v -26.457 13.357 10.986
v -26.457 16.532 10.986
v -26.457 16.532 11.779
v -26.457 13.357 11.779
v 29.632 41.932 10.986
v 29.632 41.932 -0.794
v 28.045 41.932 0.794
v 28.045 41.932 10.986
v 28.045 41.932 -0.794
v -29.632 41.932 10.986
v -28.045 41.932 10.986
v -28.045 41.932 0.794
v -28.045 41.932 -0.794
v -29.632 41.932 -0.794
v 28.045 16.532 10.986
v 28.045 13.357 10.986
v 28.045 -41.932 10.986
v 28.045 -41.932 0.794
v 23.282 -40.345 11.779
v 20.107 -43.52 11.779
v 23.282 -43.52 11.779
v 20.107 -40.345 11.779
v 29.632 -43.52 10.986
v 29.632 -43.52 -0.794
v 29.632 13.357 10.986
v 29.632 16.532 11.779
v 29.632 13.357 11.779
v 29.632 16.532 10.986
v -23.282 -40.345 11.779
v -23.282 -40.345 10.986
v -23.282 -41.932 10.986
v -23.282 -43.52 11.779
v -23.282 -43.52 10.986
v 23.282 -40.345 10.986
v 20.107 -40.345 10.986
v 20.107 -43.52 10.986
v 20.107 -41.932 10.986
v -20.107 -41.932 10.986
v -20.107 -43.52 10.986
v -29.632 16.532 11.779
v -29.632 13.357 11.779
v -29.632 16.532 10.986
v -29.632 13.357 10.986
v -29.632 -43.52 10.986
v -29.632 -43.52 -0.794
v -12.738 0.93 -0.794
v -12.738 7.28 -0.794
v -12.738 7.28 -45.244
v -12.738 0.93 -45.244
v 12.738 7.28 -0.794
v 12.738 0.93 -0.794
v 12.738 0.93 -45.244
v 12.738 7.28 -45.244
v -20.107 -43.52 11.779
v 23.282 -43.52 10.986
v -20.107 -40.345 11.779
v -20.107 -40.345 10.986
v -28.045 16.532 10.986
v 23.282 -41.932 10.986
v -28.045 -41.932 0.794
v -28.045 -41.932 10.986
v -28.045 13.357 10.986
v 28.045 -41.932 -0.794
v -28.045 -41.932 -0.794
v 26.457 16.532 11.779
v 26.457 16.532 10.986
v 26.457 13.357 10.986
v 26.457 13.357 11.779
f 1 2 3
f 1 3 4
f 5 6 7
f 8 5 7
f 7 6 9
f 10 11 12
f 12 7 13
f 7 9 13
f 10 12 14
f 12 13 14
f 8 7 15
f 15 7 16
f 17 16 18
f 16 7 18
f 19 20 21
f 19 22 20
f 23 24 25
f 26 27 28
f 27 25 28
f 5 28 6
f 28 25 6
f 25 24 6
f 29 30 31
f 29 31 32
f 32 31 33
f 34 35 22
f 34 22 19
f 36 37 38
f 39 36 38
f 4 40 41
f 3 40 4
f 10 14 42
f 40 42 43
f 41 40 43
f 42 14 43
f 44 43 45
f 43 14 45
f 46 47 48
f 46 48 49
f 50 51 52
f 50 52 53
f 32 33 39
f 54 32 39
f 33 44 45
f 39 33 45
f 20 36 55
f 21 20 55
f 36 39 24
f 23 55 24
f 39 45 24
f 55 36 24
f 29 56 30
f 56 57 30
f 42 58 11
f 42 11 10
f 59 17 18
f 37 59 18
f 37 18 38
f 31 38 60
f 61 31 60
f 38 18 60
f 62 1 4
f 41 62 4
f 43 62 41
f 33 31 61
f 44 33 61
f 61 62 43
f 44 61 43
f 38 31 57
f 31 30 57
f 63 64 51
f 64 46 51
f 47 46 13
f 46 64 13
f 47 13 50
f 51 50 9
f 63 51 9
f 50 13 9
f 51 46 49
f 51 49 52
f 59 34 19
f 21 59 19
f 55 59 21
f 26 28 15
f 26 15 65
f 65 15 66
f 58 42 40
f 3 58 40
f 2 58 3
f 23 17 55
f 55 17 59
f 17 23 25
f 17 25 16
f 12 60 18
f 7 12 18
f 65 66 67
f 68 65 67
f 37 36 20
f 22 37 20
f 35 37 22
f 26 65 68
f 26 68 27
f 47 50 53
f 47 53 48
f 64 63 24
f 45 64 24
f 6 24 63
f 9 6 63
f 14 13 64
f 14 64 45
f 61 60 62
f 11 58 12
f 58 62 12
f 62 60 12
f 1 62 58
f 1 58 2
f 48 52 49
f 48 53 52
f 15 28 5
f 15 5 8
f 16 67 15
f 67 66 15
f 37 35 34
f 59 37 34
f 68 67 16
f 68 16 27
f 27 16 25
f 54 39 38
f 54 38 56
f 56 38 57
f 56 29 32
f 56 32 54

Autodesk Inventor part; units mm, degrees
ref_plane "YZ Plane" through (0, 0, 0) normal (1, 0, 0) x (0, 1, 0)
ref_plane "XZ Plane" through (0, 0, 0) normal (0, 1, 0) x (-1, 0, 0)
ref_plane "XY Plane" through (0, 0, 0) normal (0, 0, 1) x (1, 0, 0)
sketch "Sketch1" plane through (0, 0, 0) normal (0, 0, 1) x (1, 0, 0)
  line L0 (28.0448, -41.9322) -> (-28.0448, -41.9322)
  line L1 (-28.0448, -41.9322) -> (-28.0448, 41.9322)
  line L2 (-28.0448, 41.9322) -> (28.0448, 41.9322)
  line L3 (28.0448, 41.9322) -> (28.0448, -41.9322)
  line L4 (28.0448, -41.9322) -> (-28.0448, 41.9322) construction
  line L5 (-28.0448, -41.9322) -> (28.0448, 41.9322) construction
  point P0 (0, 0)
  dimension "d0" = 56.0896
  dimension "d1" = 83.8645
extrude "Container Backplate" add sketch "Sketch1" along normal mid plane 1.5875
sketch "Sketch2" plane through (0, 0, -0.7937) normal (0, 0, -1) x (-1, 0, 0)
  line L0 (28.0448, 41.9322) -> (-28.0448, 41.9322) projected
  line L1 (-28.0448, 41.9322) -> (-28.0448, -41.9322) projected
  line L2 (-28.0448, -41.9322) -> (28.0448, -41.9322) projected
  line L3 (28.0448, -41.9322) -> (28.0448, 41.9322) projected
  line L4 (-29.6323, 43.5197) -> (29.6323, 43.5197)
  line L5 (29.6323, 43.5197) -> (29.6323, -43.5197)
  line L6 (29.6323, -43.5197) -> (-29.6323, -43.5197)
  line L7 (-29.6323, -43.5197) -> (-29.6323, 43.5197)
  line L8 (28.0448, 41.9322) -> (29.6323, 41.9322)
  line L9 (-28.0448, 41.9322) -> (-29.6323, 41.9322)
  point P0 (0, 0)
  point P1 (28.0448, 43.5197)
  point P2 (-28.0448, 43.5197)
  dimension "d4" = 1.5875
extrude "Container Walls" add sketch "Sketch2" against normal blind 11.7792 contours L8 L5 L6 L7 L9 L1 L2 L3
sketch "Sketch3" plane through (0, 0, 10.9855) normal (0, 0, 1) x (1, 0, 0)
  line L0 (-23.2823, -43.5197) -> (-20.1073, -43.5197)
  line L1 (-20.1073, -43.5197) -> (-20.1073, -40.3447)
  line L2 (-20.1073, -40.3447) -> (-23.2823, -40.3447)
  line L3 (-23.2823, -40.3447) -> (-23.2823, -43.5197)
  line L4 (-29.6323, -43.5197) -> (29.6323, -43.5197) projected
  line L5 (28.0448, -41.9322) -> (-28.0448, -41.9322) projected
  line L6 (-29.6323, 41.9322) -> (-29.6323, -43.5197) projected
  line L7 (-29.6323, 16.5322) -> (-26.4573, 16.5322)
  line L8 (-26.4573, 16.5322) -> (-26.4573, 13.3572)
  line L9 (-26.4573, 13.3572) -> (-29.6323, 13.3572)
  line L10 (-29.6323, 13.3572) -> (-29.6323, 16.5322)
  line L11 (28.0448, 41.9322) -> (-28.0448, 41.9322) projected
  line L12 (0, 41.9322) -> (0, -43.5197)
  line L13 (23.2823, -43.5197) -> (20.1073, -43.5197)
  line L14 (20.1073, -43.5197) -> (20.1073, -40.3447)
  line L15 (20.1073, -40.3447) -> (23.2823, -40.3447)
  line L16 (23.2823, -40.3447) -> (23.2823, -43.5197)
  line L17 (29.6323, 43.5197) -> (29.6323, -43.5197)
  line L18 (29.6323, 16.5322) -> (26.4573, 16.5322)
  line L19 (26.4573, 16.5322) -> (26.4573, 13.3572)
  line L20 (26.4573, 13.3572) -> (29.6323, 13.3572)
  line L21 (29.6323, 13.3572) -> (29.6323, 16.5322)
  point P0 (0, 0)
  point P1 (-29.6323, 43.5197)
  dimension "d7" = 3.175
  dimension "d8" = 3.175
  dimension "d9" = 6.35
  dimension "d10" = 3.175
  dimension "d11" = 3.175
  dimension "d12" = 25.4
extrude "Container Tabs" add sketch "Sketch3" along normal blind 0.7937 contours L3 L5 L1 L0 | L20 L19 L18 L17 | L6 L7 L8 L9 | L3 L2 L1 L5 | L14 L5 L16 L4 | L14 L15 L16 L5
sketch "Sketch11" plane through (0, 0, -0.7937) normal (0, 0, -1) x (-1, 0, 0)
  line L0 (-12.7381, 7.2803) -> (12.7381, 7.2803)
  line L1 (12.7381, 7.2803) -> (12.7381, 0.9303)
  line L2 (12.7381, 0.9303) -> (-12.7381, 0.9303)
  line L3 (-12.7381, 0.9303) -> (-12.7381, 7.2803)
  line L4 (-29.6323, -43.5197) -> (29.6323, -43.5197) projected
  point P0 (0, 0)
  point P1 (0, 7.2803)
  dimension "d58" = 25.4762
  dimension "d59" = 6.35
  dimension "d60" = 44.45
extrude "Servo Connector Tab" add sketch "Sketch11" along normal blind 44.45
properties part number "MovingCompartment"
